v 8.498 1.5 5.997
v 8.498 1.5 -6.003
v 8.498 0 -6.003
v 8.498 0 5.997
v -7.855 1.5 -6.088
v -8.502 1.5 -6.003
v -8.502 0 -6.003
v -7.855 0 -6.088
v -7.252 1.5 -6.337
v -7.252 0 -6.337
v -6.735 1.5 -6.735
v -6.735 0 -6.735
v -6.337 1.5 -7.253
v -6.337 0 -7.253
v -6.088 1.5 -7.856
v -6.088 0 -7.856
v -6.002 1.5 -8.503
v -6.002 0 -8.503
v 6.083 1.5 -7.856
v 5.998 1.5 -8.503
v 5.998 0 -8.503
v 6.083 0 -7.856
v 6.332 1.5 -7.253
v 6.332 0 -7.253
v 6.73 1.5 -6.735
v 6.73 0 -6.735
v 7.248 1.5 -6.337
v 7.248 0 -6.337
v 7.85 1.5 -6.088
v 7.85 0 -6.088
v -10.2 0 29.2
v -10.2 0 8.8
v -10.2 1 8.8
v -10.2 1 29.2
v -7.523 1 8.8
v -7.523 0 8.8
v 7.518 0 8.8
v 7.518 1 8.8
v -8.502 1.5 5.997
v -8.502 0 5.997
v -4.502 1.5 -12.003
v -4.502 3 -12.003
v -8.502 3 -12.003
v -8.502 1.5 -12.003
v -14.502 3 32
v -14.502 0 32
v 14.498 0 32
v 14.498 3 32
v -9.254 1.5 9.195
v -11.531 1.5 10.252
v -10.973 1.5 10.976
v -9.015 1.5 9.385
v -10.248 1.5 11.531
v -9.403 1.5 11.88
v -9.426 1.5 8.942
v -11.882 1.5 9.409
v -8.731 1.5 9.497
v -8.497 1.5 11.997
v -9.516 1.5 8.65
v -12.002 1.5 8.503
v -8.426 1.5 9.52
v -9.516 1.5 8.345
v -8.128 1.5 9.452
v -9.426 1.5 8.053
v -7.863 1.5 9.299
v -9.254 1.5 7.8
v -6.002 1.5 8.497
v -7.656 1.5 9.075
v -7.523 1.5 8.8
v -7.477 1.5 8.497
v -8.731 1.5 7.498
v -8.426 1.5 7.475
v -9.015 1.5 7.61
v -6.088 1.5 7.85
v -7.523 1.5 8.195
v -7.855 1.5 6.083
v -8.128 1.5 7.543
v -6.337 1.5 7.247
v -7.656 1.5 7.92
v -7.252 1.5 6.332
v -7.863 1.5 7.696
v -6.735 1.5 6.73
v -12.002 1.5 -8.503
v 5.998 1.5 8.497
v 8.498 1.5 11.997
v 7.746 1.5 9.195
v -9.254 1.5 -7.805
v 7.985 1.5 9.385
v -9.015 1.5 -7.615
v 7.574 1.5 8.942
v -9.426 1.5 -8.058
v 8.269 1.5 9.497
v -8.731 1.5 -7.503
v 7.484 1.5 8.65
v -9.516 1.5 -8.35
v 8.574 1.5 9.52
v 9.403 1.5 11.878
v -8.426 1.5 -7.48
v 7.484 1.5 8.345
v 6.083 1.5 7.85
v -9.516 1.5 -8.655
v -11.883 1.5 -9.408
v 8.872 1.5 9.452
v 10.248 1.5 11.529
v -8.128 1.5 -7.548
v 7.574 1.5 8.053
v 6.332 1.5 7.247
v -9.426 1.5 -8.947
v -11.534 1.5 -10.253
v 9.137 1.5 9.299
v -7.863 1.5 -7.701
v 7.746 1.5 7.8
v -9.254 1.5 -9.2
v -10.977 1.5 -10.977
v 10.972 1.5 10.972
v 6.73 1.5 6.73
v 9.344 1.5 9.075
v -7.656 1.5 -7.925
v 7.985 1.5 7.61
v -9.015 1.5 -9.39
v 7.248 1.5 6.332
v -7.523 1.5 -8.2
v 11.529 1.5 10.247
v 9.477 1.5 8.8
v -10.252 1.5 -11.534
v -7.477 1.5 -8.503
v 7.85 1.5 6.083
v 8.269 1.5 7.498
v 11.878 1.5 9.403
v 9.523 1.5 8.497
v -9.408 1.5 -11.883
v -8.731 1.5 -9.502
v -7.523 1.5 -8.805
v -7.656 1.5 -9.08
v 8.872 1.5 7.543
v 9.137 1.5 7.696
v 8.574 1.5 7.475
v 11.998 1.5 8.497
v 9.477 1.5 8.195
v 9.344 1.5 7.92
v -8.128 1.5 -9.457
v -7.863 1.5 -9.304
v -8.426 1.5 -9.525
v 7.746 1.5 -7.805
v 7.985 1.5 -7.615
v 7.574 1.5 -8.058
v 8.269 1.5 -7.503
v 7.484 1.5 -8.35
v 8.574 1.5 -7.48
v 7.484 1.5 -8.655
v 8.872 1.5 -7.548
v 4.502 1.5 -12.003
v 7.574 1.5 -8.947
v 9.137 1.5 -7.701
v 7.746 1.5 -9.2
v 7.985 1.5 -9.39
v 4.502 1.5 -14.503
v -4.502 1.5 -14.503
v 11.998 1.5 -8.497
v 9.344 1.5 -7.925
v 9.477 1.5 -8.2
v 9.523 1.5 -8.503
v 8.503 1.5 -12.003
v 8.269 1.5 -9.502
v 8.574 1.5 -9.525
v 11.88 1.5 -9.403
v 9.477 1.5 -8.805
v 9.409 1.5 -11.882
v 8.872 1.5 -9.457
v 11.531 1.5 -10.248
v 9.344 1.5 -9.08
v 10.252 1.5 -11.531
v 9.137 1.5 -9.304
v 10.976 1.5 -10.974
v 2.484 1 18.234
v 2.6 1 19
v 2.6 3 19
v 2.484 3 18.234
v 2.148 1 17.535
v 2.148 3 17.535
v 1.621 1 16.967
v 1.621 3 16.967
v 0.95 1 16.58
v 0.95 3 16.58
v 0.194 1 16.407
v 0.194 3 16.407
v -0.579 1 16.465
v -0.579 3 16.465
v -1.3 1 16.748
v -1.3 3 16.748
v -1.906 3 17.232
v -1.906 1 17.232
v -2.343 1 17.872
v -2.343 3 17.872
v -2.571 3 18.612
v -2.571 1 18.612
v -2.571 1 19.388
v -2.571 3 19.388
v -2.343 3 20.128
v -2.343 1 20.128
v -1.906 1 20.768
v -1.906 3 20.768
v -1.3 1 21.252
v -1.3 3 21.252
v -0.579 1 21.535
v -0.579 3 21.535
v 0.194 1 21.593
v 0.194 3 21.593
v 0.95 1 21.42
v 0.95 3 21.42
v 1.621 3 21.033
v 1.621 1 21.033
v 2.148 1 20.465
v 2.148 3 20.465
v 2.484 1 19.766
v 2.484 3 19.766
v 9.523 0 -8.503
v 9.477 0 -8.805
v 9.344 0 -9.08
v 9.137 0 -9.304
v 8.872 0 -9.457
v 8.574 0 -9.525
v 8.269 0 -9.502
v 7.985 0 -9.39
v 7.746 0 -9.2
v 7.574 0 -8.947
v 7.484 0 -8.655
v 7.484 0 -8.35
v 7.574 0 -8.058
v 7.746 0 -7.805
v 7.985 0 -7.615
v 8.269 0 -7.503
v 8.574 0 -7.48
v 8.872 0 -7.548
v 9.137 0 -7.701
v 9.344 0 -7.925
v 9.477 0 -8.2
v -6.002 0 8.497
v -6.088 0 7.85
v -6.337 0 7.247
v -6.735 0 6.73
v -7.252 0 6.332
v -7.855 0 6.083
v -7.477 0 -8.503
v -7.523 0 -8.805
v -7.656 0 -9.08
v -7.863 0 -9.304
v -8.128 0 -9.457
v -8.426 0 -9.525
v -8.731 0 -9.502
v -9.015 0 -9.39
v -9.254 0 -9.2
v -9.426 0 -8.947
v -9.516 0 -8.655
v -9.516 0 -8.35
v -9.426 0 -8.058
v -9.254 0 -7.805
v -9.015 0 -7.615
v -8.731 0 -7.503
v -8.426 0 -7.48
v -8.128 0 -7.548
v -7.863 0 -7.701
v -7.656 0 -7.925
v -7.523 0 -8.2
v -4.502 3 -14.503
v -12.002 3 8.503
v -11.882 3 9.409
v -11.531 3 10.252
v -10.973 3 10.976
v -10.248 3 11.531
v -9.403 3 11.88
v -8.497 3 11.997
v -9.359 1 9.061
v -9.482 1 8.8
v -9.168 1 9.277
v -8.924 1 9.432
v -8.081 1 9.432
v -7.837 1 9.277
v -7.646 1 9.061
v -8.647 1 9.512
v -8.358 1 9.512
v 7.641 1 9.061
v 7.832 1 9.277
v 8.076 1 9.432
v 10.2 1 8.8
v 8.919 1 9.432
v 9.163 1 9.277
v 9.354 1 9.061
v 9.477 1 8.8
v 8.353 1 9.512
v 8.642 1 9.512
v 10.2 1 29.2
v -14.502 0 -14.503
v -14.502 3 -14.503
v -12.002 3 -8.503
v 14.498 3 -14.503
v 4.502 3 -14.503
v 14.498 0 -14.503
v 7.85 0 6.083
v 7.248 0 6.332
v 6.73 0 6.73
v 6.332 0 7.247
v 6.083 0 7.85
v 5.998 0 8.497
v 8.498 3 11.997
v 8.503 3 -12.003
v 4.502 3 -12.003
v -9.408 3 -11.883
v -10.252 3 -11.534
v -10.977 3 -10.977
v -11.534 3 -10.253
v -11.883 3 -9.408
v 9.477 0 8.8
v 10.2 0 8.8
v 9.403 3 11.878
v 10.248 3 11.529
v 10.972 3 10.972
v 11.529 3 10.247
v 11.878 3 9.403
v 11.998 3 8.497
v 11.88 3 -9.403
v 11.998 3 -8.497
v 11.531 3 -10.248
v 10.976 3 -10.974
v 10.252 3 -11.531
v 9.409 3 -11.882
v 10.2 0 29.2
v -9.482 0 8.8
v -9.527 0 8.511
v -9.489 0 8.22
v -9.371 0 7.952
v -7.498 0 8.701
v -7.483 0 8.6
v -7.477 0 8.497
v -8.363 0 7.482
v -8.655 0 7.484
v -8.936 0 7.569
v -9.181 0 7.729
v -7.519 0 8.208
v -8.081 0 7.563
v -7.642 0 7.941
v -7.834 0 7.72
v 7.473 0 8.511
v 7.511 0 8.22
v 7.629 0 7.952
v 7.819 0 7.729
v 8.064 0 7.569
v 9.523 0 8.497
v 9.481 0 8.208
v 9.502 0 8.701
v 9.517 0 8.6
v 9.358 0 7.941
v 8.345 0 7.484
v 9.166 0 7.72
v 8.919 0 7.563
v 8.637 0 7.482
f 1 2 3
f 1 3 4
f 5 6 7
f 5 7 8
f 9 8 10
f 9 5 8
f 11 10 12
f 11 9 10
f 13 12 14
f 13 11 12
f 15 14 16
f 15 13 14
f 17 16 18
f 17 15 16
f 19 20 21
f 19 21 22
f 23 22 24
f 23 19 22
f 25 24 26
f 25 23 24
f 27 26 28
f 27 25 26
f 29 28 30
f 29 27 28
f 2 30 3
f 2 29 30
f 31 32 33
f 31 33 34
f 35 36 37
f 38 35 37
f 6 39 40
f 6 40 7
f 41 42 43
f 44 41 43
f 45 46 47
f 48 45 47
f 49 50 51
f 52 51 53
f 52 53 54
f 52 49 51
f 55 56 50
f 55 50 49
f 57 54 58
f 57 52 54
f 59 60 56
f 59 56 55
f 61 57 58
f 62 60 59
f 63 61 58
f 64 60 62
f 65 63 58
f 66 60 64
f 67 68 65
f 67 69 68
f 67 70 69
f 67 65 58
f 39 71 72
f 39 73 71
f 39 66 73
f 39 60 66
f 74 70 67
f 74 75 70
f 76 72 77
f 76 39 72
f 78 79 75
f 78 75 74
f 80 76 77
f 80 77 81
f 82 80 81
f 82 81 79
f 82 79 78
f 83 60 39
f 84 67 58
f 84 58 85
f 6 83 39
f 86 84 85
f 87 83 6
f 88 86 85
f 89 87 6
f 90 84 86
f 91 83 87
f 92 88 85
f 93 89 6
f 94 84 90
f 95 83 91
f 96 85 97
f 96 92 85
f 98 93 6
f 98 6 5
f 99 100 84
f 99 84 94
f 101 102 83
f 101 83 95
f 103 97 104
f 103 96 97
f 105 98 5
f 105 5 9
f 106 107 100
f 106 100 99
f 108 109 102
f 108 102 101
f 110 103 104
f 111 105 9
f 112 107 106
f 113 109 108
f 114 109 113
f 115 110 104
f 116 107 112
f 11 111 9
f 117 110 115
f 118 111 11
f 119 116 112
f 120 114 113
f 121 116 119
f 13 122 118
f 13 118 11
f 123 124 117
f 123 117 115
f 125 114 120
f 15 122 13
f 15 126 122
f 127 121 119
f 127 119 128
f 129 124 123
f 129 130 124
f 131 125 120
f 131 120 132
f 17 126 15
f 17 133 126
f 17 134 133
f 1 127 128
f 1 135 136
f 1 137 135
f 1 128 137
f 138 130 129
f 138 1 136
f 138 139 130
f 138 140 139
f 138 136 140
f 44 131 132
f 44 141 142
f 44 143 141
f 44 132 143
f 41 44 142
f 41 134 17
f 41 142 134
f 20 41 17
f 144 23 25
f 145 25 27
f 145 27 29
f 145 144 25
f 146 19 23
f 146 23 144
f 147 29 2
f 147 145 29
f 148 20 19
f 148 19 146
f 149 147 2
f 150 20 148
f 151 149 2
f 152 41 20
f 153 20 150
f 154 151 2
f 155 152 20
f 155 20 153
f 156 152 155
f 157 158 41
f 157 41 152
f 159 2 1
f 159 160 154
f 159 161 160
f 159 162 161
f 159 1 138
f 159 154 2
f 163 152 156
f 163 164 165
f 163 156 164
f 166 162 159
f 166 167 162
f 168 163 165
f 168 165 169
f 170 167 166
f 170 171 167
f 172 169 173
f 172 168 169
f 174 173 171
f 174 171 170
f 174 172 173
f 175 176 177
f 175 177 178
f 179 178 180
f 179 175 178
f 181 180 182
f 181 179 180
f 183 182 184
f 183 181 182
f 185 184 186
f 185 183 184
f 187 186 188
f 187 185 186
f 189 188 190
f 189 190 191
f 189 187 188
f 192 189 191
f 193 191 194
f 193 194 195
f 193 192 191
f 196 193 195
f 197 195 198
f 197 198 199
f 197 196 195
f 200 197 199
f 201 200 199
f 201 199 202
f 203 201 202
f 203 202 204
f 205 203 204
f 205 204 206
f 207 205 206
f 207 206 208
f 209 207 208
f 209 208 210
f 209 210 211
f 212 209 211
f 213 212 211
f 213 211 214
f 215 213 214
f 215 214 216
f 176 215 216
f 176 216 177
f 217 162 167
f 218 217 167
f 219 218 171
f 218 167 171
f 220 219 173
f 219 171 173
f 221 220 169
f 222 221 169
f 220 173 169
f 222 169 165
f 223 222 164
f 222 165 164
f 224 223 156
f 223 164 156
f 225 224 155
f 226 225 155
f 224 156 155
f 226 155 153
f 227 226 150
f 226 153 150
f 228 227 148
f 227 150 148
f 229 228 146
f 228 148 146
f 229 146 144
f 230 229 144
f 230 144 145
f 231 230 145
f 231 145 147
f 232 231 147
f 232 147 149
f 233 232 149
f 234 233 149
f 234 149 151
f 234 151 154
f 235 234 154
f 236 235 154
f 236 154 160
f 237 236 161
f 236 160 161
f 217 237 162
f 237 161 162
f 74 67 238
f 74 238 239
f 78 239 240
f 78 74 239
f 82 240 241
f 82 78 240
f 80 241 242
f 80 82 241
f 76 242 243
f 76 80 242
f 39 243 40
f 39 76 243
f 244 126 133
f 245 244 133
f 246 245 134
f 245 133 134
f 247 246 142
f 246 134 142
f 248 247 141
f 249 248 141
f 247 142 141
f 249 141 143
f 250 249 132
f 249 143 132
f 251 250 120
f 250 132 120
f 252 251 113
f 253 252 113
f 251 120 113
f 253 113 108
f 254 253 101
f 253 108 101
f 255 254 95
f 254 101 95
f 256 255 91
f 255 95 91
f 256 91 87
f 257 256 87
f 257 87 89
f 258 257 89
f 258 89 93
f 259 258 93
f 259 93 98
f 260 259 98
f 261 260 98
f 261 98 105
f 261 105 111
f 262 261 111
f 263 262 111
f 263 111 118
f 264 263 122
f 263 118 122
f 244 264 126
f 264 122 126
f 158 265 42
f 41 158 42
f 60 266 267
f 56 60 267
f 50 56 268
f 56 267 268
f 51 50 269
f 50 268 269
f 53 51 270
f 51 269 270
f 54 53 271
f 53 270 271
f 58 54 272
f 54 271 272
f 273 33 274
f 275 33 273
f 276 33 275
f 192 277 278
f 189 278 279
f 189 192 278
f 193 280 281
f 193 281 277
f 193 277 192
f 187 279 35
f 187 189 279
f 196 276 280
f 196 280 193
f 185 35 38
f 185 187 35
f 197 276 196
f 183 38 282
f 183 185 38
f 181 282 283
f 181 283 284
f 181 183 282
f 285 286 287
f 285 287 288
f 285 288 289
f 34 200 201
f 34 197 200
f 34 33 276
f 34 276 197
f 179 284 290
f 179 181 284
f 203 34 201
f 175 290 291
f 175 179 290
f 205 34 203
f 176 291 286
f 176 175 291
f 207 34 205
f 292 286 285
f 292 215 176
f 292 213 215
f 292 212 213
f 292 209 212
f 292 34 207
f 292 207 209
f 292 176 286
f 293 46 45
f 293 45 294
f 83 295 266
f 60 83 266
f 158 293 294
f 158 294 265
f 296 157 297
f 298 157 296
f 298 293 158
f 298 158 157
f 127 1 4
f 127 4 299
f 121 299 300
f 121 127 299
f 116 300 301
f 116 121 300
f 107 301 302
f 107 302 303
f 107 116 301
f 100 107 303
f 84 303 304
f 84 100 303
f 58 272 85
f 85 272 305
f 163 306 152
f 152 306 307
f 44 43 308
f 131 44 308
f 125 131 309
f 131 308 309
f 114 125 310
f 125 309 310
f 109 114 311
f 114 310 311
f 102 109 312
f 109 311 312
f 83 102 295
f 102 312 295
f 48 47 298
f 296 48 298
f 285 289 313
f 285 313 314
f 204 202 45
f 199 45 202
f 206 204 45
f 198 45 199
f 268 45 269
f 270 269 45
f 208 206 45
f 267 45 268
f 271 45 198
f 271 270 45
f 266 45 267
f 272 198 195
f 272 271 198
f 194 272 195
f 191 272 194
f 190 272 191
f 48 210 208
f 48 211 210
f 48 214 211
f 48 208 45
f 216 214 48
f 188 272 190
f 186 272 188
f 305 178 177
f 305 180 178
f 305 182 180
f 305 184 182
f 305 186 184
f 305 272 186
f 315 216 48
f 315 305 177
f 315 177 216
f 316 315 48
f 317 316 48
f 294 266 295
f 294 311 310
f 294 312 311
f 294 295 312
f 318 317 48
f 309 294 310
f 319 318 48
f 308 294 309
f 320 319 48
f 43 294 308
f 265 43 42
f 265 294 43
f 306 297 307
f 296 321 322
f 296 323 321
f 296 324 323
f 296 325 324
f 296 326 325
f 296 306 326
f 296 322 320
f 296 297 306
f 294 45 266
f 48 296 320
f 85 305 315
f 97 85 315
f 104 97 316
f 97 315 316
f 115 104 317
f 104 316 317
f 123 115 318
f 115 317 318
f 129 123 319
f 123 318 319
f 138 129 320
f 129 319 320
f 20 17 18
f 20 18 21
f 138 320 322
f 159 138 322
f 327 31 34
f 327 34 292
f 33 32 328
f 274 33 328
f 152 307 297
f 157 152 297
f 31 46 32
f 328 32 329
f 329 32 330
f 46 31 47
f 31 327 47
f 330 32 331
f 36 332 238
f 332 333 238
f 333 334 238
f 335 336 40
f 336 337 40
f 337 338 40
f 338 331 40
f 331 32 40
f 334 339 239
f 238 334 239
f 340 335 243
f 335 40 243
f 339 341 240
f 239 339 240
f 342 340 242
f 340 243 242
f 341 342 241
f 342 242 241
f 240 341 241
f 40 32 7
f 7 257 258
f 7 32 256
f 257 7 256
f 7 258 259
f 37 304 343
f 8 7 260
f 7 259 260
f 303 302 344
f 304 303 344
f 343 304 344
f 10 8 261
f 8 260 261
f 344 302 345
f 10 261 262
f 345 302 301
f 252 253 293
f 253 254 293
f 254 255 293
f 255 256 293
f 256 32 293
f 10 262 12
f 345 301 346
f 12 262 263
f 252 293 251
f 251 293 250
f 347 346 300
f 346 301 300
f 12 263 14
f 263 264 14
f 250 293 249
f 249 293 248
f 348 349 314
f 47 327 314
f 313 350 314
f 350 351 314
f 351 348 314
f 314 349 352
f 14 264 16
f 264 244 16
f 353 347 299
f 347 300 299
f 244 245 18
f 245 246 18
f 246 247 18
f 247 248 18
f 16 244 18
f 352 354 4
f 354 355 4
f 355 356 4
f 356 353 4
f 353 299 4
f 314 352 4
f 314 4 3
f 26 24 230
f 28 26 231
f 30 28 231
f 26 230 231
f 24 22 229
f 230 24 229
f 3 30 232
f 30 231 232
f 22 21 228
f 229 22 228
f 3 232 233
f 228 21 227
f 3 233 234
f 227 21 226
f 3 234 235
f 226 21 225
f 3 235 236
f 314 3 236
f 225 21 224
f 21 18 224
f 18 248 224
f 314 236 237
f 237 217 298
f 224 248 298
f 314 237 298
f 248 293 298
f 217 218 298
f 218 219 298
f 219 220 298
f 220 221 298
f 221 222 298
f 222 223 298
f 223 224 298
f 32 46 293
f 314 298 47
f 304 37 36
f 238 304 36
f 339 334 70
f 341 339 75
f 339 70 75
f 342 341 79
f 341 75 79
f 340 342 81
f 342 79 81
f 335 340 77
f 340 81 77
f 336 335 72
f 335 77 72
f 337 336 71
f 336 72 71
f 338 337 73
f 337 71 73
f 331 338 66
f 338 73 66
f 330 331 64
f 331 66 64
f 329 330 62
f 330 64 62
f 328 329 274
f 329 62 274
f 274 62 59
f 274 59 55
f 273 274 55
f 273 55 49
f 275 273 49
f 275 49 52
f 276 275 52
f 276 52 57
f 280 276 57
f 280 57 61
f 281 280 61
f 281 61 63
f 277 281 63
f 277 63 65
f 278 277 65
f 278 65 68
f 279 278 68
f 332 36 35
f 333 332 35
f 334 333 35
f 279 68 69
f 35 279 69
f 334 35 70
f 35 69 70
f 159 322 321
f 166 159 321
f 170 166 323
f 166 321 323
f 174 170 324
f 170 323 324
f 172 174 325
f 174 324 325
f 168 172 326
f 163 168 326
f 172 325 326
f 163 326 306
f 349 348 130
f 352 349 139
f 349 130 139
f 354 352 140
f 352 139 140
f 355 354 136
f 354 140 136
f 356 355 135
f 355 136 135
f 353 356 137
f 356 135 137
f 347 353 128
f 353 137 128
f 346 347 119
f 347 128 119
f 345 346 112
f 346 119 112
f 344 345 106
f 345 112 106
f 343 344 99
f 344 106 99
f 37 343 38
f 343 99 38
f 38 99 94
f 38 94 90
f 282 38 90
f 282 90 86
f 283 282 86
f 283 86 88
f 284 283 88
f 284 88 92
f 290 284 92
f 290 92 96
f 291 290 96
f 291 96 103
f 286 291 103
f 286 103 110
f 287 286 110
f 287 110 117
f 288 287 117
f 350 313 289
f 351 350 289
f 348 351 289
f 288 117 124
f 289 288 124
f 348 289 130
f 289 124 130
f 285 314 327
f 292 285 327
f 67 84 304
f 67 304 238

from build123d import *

# Parameters (mm, degrees)
SKETCH3_W           = 29
SKETCH3_H           = 46.502559765
SKETCH3_R           = 2.6
BOSS_EXTRUDE1_DEPTH = 3
SKETCH4_W           = 20.4
SKETCH4_H           = 20.4
CUT_EXTRUDE1_DEPTH  = 1
CUT_EXTRUDE2_DEPTH  = 1.5
SKETCH6_R           = 1.025
CUT_EXTRUDE3_DEPTH  = 1.5
CUT_EXTRUDE4_DEPTH  = 1.5


with BuildPart() as part:
    # Sketch3 → Boss-Extrude1 (new body)
    with BuildSketch(Plane(origin=(0, 0, 0), x_dir=(1, 0, 0), z_dir=(0, 1, 0))):
        with Locations((-0.002492114, -8.748720117)):
            Rectangle(SKETCH3_W, SKETCH3_H)
        with Locations((0, -19)):
            Circle(SKETCH3_R, mode=Mode.SUBTRACT)
    extrude(amount=BOSS_EXTRUDE1_DEPTH)

    # Sketch4 → Cut-Extrude1 (cut)
    with BuildSketch(Plane.XZ):
        with Locations((0, 19)):
            Rectangle(SKETCH4_W, SKETCH4_H)
    extrude(amount=-CUT_EXTRUDE1_DEPTH, mode=Mode.SUBTRACT)

    # Sketch5 → Cut-Extrude2 (cut)
    with BuildSketch(Plane(origin=(0, 3, 0), x_dir=(1, 0, 0), z_dir=(0, 1, 0))):
        with BuildLine():
            Line((-12.00249203, 8.502556434), (-12.00249175, -8.502983271))
            ThreePointArc((-12.00249175, -8.502983271), (-10.973497147, -10.976182335), (-8.497093239, -11.997440002))
            Line((-8.497093239, -11.997440002), (8.497508549, -11.997440458))
            ThreePointArc((8.497508549, -11.997440458), (10.972380637, -10.972314999), (11.99750783, -8.497443607))
            Line((11.99750783, -8.497443607), (11.997507522, 8.497016765))
            ThreePointArc((11.997507522, 8.497016765), (10.976250085, 10.973564476), (8.502907209, 12.002559308))
            Line((8.502907209, 12.002559308), (4.502491803, 12.00255968))
            Line((4.502491803, 12.00255968), (4.502491803, 14.502559765))
            Line((4.502491803, 14.502559765), (-4.502491803, 14.502559765))
            Line((-4.502491803, 14.502559765), (-4.502491803, 12.002559739))
            Line((-4.502491803, 12.002559739), (-8.502491889, 12.002559765))
            ThreePointArc((-8.502491889, 12.002559765), (-10.977366841, 10.977432329), (-12.00249203, 8.502556434))
        make_face()
    extrude(amount=-CUT_EXTRUDE2_DEPTH, mode=Mode.SUBTRACT)

    # Sketch6 → Cut-Extrude3 (cut)
    with BuildSketch(Plane(origin=(0, 1.5, 0), x_dir=(1, 0, 0), z_dir=(0, 1, 0))):
        with Locations((-8.502491891, 8.502559653)):
            Circle(SKETCH6_R)
        with Locations((8.497508109, 8.502559653)):
            Circle(SKETCH6_R)
        with Locations((8.497507663, -8.497440347)):
            Circle(SKETCH6_R)
        with Locations((-8.502492337, -8.497440347)):
            Circle(SKETCH6_R)
    extrude(amount=-CUT_EXTRUDE3_DEPTH, mode=Mode.SUBTRACT)

    # Sketch7 → Cut-Extrude4 (cut)
    with BuildSketch(Plane(origin=(0, 1.5, 0), x_dir=(1, 0, 0), z_dir=(0, 1, 0))):
        with BuildLine():
            Line((-6.002491891, 8.502559653), (5.997508109, 8.502559653))
            ThreePointArc((5.997508109, 8.502559653), (6.729741157, 6.7347927), (8.497508109, 6.002559653))
            Line((8.497508109, 6.002559653), (8.497508109, -5.997440347))
            ThreePointArc((8.497508109, -5.997440347), (6.729740868, -6.729673236), (5.997507663, -8.497440347))
            Line((5.997507663, -8.497440347), (-6.002492337, -8.497440347))
            ThreePointArc((-6.002492337, -8.497440347), (-6.734725226, -6.729673552), (-8.502491891, -5.997440347))
            Line((-8.502491891, -5.997440347), (-8.502491891, 6.002559653))
            ThreePointArc((-8.502491891, 6.002559653), (-6.734724938, 6.7347927), (-6.002491891, 8.502559653))
        make_face()
    extrude(amount=-CUT_EXTRUDE4_DEPTH, mode=Mode.SUBTRACT)


solid = part.part
